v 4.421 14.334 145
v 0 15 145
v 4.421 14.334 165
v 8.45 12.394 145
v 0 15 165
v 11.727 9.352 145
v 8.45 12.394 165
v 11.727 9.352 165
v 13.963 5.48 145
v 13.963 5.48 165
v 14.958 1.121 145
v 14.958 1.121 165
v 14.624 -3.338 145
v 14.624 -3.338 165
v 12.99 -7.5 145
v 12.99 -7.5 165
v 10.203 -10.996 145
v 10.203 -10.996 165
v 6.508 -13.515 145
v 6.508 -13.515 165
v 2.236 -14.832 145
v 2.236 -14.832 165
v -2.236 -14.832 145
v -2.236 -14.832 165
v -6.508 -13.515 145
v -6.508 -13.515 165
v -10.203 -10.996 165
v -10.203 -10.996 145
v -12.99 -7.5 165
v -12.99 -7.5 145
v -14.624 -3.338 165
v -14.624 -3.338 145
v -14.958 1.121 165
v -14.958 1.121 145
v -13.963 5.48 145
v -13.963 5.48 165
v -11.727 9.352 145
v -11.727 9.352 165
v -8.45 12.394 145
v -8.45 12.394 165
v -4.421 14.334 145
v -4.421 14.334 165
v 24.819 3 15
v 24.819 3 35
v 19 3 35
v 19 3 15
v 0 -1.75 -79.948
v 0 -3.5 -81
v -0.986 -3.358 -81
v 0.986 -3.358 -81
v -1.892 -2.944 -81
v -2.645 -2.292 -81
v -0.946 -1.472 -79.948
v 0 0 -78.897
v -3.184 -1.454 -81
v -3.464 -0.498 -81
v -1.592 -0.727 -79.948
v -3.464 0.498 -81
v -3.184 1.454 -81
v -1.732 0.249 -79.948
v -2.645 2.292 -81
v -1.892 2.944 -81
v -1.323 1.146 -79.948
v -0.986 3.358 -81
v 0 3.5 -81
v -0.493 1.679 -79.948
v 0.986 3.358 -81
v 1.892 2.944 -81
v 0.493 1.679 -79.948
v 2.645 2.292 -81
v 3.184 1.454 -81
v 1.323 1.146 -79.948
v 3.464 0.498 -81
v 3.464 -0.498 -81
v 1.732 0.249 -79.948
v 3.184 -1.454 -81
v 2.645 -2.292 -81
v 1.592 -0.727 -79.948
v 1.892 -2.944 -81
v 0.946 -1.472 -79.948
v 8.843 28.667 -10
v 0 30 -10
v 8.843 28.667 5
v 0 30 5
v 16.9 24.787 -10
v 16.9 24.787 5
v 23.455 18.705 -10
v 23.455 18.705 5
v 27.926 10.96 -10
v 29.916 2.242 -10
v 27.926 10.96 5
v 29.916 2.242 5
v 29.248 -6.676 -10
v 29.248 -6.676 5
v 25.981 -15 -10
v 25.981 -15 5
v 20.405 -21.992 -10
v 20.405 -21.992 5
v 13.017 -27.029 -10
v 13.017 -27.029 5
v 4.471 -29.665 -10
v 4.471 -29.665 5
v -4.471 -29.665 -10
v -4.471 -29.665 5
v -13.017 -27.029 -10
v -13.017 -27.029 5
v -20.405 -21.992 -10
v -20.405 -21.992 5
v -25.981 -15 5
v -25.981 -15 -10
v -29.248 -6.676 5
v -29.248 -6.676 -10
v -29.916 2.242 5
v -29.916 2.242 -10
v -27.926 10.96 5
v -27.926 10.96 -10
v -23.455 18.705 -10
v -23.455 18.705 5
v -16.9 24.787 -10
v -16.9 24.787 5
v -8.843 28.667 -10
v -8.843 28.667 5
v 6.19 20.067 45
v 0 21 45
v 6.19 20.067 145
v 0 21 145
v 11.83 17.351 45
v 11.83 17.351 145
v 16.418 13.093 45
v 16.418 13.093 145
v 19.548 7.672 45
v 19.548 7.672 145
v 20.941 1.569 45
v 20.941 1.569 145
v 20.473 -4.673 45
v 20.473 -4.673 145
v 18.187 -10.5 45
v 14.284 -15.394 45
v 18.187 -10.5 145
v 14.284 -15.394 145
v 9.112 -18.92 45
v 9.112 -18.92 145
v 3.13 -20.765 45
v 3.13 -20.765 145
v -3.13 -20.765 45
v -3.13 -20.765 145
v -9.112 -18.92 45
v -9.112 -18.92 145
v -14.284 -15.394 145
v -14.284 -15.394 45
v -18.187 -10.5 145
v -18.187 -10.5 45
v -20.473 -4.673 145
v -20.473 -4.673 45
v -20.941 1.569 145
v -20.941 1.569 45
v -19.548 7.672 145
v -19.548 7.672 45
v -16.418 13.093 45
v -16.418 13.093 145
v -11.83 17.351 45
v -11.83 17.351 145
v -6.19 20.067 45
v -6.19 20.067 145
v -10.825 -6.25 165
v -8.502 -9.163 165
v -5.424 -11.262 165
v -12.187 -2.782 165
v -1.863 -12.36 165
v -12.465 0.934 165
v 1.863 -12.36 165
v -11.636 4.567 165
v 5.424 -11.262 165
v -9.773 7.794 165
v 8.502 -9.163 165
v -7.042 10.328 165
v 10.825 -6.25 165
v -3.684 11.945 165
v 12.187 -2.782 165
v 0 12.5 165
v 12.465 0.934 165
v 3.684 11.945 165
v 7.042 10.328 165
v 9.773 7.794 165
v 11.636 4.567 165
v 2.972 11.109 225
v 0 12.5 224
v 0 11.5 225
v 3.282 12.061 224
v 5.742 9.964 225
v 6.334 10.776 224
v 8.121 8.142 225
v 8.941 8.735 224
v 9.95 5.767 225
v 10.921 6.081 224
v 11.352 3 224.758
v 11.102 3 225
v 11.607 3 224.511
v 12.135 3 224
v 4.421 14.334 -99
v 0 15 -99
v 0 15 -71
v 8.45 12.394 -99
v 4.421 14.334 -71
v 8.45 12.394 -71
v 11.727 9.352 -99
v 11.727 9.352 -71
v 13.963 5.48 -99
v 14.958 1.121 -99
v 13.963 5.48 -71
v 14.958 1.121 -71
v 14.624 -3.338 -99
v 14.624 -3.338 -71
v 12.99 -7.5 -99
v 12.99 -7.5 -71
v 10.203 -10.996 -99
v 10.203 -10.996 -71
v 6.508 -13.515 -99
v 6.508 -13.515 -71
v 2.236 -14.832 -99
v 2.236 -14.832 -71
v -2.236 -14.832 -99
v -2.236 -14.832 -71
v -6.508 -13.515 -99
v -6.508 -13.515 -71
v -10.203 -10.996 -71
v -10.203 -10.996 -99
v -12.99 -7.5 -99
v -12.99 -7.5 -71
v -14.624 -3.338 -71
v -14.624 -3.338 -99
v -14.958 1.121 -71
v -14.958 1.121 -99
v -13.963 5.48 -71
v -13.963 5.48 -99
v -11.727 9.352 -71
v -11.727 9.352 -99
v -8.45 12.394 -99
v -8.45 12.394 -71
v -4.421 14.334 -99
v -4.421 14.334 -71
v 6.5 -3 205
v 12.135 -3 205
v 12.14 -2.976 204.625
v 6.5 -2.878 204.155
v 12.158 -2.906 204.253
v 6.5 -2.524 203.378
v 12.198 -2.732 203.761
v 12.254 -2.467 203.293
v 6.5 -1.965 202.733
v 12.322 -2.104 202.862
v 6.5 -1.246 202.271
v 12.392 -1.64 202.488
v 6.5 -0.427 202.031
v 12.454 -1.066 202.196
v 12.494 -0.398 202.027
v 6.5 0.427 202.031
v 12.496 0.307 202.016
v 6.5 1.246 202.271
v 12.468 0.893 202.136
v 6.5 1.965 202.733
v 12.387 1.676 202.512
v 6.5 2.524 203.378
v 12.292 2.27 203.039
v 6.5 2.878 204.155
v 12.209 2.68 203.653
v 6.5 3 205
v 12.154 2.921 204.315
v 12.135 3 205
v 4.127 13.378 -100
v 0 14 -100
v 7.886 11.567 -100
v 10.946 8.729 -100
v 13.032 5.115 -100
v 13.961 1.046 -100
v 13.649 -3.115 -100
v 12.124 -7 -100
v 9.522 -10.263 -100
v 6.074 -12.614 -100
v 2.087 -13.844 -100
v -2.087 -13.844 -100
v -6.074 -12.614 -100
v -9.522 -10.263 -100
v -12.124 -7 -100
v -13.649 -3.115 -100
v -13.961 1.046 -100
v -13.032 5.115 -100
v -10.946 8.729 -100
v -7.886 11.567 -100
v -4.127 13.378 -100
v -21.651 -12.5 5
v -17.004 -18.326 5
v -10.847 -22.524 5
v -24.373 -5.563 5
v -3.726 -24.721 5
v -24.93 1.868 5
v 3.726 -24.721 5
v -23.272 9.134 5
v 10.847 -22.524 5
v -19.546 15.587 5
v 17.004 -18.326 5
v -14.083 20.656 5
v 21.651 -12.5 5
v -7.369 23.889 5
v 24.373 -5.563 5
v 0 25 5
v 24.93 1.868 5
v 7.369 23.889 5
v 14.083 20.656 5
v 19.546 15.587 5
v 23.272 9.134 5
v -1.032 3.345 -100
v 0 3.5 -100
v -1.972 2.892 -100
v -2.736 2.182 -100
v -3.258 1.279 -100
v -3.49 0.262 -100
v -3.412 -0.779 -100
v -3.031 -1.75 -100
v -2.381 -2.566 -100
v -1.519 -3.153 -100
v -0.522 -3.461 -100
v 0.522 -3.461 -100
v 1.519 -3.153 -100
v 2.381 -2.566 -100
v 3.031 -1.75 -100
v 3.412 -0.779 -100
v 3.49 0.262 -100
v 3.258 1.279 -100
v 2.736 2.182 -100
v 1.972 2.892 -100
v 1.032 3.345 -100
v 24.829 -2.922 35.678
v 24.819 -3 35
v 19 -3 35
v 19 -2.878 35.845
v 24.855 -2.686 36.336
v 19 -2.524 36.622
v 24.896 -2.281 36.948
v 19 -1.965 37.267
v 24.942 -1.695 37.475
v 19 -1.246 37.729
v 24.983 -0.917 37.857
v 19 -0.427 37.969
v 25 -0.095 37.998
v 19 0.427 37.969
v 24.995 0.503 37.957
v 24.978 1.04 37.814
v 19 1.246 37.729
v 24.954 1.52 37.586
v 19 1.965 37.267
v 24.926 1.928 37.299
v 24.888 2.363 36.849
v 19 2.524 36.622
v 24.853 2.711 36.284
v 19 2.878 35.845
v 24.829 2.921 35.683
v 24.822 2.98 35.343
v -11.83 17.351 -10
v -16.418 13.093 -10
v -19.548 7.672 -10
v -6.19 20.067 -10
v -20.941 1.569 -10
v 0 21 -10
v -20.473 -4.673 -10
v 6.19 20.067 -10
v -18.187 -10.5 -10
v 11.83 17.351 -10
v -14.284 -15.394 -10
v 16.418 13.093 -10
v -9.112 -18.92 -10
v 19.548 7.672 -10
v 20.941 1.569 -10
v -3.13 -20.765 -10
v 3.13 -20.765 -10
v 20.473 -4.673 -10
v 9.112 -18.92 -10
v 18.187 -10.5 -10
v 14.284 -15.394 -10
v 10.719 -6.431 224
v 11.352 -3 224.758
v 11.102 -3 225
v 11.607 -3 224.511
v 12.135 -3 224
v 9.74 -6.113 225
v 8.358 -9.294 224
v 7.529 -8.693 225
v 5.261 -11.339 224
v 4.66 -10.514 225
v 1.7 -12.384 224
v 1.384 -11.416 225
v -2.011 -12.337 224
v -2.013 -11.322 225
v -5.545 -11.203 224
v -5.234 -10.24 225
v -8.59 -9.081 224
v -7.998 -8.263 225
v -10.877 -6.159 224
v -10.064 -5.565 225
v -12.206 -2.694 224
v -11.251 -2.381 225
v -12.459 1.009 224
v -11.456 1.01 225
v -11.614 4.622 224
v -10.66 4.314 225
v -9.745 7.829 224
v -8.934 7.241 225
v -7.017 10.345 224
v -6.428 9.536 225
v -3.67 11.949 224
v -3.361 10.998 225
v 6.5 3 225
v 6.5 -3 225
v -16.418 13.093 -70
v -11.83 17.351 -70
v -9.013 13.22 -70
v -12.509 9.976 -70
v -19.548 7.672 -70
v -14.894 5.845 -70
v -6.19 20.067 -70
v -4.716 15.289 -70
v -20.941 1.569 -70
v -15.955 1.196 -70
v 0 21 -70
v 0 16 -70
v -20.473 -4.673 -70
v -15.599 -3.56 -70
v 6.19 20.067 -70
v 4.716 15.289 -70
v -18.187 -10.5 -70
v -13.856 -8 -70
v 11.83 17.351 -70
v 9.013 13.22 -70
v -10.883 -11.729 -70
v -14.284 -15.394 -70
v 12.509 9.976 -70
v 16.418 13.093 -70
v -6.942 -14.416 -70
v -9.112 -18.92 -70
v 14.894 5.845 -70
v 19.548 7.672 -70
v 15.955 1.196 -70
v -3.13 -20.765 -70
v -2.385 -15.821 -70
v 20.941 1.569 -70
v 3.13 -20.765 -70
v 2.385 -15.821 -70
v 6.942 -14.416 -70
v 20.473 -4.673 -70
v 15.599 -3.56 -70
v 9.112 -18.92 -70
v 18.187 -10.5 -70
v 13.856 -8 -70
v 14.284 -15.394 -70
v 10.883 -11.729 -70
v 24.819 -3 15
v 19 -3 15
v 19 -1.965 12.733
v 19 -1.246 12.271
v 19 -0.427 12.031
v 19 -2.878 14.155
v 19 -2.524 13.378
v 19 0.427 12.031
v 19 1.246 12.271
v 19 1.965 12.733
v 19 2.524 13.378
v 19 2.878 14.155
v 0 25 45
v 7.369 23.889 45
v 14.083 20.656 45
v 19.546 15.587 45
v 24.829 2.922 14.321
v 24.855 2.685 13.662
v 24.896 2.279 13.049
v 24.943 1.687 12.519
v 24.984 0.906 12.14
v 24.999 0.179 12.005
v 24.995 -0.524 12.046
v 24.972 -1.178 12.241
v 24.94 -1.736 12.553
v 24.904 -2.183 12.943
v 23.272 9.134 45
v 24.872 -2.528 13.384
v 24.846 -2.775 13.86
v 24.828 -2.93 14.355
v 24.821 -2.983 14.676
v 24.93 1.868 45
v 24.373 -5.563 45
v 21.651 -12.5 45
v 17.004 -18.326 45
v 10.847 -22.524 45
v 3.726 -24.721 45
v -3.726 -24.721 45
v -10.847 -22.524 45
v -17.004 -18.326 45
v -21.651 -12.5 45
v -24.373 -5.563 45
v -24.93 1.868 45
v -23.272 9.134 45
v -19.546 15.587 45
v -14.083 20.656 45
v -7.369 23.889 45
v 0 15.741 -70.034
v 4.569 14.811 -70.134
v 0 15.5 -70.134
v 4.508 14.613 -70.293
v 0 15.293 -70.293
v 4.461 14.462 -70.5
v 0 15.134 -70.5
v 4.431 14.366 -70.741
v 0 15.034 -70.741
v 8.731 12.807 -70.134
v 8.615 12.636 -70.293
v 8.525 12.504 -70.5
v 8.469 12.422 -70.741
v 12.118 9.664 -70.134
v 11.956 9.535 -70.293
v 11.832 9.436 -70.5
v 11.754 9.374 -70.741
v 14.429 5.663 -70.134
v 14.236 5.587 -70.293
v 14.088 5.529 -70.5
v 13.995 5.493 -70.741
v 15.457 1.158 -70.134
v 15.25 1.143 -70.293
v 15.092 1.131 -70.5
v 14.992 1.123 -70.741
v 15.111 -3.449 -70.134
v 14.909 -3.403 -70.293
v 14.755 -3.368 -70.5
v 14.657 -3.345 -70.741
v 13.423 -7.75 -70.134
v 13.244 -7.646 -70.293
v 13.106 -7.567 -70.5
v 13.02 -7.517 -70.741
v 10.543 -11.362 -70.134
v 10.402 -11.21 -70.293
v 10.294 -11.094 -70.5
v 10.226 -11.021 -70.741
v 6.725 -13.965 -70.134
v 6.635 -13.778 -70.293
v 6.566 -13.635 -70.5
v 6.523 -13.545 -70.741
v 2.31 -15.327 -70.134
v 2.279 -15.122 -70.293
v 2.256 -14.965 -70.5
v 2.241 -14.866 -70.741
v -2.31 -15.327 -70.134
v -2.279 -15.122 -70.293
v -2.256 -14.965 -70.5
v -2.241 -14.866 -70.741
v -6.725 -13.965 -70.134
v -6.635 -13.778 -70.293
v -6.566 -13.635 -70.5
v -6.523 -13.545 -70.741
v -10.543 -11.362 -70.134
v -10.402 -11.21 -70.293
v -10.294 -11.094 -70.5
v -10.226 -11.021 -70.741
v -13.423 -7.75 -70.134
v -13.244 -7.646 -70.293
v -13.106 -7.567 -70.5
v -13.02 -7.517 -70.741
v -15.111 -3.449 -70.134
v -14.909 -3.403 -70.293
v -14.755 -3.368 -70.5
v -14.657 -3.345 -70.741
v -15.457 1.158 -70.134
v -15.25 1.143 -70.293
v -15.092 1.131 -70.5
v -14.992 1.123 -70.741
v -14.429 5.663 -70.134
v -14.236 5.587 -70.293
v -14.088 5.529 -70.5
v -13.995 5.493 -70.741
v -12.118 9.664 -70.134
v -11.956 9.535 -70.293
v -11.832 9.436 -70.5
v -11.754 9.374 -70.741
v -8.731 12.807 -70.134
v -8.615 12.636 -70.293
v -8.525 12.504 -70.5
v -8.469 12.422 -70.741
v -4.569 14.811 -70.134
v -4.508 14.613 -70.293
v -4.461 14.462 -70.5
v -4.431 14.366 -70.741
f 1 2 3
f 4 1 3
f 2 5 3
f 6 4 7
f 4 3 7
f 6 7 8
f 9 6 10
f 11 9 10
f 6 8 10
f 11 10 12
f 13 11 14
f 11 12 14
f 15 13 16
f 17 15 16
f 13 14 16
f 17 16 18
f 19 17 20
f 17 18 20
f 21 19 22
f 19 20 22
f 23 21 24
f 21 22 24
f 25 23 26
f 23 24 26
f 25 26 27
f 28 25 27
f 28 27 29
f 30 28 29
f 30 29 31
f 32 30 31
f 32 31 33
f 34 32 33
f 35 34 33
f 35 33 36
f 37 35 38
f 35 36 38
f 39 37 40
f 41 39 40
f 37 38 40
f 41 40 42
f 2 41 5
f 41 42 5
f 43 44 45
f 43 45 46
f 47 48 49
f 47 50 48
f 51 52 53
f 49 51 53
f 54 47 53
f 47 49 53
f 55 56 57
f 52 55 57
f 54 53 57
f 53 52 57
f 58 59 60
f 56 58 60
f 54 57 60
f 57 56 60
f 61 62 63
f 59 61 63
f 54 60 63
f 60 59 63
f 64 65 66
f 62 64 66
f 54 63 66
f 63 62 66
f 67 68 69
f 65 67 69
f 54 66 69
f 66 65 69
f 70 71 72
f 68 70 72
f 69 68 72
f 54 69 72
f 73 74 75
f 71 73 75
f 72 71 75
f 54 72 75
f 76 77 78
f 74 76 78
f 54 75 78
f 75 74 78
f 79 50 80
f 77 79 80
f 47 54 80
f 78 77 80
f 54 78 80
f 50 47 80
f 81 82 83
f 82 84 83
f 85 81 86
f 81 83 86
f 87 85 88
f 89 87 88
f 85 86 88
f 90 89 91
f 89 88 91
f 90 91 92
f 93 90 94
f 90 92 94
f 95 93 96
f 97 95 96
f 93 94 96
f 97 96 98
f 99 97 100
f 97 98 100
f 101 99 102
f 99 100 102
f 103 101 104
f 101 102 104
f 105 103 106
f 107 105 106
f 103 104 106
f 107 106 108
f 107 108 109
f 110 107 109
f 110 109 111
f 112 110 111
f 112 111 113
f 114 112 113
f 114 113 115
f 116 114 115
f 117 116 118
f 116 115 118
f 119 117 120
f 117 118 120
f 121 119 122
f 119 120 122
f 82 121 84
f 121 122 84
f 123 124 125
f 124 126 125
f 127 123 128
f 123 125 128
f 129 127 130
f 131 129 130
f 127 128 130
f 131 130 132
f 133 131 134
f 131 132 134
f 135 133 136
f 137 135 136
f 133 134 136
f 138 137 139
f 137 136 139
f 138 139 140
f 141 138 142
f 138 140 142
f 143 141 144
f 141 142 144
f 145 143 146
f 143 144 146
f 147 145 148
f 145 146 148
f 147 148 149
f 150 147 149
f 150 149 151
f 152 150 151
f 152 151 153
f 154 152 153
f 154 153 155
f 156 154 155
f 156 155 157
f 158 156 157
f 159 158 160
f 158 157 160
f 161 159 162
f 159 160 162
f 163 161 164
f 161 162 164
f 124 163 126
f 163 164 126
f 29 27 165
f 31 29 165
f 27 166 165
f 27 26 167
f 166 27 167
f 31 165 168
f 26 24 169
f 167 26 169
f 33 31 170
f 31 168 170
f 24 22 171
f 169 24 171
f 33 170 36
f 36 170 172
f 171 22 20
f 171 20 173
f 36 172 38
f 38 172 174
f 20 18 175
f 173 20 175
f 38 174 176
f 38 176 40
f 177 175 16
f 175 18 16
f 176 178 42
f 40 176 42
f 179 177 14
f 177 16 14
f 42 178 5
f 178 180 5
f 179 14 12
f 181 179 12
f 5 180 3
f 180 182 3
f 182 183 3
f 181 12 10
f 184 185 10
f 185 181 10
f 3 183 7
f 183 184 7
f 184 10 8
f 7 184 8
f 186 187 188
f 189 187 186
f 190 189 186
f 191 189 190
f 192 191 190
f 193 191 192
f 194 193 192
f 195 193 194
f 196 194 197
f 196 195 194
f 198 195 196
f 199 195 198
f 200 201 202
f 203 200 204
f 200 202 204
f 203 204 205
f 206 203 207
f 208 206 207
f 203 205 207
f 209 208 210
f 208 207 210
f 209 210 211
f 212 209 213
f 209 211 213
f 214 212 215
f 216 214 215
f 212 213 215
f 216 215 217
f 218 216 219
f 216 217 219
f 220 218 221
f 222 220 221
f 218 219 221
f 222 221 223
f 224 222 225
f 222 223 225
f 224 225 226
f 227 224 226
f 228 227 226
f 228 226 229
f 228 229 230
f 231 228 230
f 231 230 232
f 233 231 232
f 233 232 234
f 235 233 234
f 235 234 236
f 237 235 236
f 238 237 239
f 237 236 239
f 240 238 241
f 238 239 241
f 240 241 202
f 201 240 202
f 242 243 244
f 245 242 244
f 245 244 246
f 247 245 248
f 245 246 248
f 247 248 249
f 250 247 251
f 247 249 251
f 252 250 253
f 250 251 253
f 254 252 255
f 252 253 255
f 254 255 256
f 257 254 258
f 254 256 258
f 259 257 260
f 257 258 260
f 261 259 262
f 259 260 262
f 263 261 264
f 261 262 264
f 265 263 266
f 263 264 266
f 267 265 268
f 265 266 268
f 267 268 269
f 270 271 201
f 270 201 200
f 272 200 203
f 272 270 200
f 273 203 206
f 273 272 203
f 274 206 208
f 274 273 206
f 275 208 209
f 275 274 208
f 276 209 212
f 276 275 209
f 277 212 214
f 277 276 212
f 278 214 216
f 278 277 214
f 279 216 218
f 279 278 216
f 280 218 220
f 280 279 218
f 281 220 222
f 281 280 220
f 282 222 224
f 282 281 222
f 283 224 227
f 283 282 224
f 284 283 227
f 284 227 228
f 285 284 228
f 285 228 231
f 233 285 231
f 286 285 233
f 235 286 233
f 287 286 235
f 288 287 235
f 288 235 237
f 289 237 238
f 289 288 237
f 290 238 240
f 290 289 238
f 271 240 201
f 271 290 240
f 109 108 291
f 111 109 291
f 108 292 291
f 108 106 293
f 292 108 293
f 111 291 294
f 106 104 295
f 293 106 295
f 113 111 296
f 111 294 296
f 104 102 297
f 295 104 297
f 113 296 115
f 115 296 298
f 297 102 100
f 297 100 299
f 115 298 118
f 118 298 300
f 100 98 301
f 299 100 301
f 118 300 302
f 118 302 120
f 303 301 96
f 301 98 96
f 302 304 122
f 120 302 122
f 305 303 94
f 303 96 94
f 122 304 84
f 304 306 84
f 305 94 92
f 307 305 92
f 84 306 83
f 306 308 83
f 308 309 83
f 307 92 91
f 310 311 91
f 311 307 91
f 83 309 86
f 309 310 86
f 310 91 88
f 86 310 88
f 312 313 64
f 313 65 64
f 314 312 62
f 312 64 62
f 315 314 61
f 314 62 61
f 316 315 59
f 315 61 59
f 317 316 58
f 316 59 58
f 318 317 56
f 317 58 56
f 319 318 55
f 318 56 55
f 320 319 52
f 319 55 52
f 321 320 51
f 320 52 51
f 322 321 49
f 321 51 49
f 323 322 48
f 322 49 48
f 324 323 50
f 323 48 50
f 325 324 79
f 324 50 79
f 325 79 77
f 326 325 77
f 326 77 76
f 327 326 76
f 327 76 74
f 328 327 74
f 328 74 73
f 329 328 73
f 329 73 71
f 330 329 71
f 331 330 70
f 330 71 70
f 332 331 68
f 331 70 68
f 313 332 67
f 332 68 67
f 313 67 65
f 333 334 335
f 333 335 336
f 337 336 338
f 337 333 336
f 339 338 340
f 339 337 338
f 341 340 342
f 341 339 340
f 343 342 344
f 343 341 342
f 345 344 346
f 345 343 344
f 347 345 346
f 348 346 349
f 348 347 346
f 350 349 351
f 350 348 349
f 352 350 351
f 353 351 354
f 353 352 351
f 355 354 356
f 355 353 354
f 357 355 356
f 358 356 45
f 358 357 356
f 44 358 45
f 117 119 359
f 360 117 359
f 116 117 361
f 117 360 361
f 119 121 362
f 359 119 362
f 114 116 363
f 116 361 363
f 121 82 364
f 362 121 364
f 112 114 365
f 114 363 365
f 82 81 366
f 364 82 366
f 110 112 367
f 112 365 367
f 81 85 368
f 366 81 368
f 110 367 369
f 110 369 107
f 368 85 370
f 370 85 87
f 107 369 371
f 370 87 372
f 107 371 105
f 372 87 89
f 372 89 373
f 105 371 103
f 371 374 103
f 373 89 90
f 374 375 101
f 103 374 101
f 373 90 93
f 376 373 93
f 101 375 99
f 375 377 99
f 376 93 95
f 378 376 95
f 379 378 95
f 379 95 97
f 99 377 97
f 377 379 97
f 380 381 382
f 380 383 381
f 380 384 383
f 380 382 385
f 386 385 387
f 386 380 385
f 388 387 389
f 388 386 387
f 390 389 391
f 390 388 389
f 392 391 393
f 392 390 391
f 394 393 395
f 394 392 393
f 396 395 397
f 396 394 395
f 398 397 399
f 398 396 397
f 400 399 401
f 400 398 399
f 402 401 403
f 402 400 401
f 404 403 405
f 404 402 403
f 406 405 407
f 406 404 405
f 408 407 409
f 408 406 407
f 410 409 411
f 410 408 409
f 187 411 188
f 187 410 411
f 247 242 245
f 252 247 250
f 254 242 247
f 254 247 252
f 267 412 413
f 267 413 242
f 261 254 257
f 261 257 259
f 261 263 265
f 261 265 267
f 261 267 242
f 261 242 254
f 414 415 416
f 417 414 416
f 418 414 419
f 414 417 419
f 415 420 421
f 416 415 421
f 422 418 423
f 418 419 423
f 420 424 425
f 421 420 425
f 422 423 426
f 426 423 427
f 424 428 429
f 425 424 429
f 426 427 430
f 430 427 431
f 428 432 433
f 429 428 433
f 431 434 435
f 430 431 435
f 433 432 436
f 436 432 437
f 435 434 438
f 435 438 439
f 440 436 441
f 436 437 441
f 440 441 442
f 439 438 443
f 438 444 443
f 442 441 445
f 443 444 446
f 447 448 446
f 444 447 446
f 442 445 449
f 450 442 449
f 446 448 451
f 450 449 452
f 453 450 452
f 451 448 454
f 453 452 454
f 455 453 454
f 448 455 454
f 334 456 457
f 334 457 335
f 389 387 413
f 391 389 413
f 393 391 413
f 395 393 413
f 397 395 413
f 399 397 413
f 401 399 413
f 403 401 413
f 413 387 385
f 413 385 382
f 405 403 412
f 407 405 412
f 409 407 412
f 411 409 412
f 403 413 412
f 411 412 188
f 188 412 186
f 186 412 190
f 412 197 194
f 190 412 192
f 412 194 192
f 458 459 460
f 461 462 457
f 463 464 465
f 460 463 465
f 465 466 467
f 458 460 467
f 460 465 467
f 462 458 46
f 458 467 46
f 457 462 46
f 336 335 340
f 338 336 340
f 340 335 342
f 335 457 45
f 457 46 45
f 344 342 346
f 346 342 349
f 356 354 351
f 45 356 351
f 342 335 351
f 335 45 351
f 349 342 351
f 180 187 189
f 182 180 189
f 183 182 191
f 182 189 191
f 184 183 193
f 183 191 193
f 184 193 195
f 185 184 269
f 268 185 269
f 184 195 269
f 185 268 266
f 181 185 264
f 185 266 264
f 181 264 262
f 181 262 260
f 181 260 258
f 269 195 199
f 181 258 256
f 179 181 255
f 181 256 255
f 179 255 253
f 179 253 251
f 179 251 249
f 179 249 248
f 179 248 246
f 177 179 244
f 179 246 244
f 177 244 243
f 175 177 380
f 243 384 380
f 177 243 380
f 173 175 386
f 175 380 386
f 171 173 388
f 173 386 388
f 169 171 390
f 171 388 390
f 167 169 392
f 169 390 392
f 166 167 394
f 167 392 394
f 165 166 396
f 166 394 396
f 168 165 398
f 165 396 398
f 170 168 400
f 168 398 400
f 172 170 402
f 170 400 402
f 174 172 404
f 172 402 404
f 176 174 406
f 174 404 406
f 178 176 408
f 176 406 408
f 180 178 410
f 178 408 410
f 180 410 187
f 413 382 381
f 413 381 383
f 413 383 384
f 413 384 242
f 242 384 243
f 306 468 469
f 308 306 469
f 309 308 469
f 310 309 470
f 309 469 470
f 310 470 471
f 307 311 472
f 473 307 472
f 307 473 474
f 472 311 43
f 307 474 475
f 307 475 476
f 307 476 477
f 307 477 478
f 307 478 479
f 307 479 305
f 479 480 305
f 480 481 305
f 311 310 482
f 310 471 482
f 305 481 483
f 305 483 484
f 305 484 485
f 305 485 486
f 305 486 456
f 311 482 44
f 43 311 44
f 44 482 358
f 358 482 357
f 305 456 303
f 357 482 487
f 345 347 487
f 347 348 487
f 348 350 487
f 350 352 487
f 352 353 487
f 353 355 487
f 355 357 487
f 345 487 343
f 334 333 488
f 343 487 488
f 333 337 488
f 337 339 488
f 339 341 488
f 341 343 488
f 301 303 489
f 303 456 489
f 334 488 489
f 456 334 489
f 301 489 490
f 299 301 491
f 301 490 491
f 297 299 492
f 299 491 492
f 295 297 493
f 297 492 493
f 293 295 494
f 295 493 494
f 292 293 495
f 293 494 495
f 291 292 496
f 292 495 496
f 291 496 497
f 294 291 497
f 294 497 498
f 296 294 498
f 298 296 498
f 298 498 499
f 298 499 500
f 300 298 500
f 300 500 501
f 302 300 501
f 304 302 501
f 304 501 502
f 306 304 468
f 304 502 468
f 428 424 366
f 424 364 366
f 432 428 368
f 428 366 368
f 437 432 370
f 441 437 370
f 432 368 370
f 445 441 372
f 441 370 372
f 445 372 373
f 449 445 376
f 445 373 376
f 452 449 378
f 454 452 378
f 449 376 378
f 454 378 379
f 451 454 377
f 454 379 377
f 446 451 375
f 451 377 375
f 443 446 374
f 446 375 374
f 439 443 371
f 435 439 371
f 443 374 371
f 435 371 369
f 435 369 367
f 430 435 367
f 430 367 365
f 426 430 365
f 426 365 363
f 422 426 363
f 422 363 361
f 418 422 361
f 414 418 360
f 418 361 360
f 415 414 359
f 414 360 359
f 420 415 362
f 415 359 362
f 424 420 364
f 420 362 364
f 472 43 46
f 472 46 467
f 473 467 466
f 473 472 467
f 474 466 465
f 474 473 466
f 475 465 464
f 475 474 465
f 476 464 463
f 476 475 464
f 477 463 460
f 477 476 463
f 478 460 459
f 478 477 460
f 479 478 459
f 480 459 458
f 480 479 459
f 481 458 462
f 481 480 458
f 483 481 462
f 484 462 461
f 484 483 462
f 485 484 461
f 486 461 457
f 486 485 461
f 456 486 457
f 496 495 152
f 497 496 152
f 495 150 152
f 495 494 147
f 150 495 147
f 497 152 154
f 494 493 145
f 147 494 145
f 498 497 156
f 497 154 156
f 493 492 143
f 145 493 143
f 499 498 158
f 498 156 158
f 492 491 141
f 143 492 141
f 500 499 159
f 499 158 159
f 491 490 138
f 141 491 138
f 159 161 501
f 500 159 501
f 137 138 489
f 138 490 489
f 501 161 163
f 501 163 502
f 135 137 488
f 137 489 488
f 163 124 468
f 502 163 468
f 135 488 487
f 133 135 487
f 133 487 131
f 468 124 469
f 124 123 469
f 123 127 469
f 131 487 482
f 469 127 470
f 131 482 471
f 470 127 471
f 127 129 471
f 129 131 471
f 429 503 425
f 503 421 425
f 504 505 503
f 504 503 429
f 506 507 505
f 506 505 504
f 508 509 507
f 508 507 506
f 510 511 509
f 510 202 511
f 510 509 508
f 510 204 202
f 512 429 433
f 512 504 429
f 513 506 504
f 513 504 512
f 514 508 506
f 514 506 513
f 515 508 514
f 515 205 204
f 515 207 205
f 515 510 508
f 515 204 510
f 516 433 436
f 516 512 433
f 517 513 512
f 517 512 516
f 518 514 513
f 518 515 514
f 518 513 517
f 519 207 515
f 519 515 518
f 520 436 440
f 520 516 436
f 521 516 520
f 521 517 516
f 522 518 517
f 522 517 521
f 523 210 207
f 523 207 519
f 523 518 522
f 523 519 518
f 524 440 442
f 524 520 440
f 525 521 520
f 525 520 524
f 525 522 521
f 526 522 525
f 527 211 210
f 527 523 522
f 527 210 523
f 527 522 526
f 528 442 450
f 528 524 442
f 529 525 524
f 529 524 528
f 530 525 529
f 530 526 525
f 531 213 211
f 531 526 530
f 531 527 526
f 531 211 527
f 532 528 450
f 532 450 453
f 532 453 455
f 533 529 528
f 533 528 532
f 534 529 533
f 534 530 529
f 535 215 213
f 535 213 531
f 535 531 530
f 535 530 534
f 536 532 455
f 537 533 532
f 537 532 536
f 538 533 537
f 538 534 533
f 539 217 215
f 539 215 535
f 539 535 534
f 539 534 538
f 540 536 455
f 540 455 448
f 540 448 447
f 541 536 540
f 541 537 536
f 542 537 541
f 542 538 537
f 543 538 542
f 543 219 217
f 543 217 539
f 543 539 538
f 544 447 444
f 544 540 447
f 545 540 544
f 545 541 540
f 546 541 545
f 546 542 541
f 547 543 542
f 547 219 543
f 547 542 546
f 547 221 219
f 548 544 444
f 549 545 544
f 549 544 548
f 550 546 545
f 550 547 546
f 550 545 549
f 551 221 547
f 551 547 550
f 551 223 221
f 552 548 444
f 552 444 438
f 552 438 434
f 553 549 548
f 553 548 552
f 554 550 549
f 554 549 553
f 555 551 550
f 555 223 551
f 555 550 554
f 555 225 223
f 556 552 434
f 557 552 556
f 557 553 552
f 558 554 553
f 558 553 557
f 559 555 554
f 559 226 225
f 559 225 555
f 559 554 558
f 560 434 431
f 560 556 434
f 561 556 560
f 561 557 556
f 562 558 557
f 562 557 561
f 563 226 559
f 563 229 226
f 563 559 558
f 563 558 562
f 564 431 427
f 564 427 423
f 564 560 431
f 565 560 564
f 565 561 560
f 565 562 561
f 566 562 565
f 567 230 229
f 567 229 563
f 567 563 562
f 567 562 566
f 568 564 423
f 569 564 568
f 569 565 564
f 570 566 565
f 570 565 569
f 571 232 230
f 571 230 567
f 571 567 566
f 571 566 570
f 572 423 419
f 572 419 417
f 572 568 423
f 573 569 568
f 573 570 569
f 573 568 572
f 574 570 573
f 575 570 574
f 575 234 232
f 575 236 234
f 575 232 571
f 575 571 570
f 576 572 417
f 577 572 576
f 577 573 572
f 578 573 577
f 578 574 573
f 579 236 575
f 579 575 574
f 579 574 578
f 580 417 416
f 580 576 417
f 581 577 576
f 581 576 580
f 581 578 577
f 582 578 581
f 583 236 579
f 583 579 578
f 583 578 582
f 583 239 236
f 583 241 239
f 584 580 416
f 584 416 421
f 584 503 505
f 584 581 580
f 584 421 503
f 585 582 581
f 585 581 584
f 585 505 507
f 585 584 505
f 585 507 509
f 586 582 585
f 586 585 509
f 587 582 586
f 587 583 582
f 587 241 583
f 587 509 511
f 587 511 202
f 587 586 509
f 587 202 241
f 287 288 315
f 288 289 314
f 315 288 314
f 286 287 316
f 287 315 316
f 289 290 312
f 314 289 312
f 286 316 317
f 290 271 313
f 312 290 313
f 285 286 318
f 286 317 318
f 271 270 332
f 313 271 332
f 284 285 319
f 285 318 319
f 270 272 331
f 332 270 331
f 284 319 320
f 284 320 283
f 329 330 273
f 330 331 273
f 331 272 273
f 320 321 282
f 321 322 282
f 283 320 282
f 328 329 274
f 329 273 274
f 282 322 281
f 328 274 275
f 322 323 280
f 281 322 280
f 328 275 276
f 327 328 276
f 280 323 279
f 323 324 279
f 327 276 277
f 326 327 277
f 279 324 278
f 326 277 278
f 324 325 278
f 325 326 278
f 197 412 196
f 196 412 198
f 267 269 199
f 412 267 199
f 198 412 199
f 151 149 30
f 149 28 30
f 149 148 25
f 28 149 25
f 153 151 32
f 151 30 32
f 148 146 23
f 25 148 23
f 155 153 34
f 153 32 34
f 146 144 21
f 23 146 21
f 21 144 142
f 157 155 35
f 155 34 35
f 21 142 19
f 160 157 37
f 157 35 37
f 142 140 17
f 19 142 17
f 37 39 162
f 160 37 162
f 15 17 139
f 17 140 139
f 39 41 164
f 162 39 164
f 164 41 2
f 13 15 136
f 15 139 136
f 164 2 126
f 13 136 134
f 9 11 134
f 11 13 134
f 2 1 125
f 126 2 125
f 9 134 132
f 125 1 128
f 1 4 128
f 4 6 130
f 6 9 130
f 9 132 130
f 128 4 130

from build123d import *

# Parameters (mm, degrees)
M8X1_0_TAPPED_HOLE1_D     = 7
M8X1_0_TAPPED_HOLE1_DEPTH = 19
M8X1_0_TAPPED_HOLE1_TIP   = 2.103012167
CUT_EXTRUDE3_DEPTH        = 6
CUT_EXTRUDE4_DEPTH        = 6
CHAMFER1_SIZE             = 1
FILLET1_R                 = 1


with BuildPart() as part:
    # Sketch2 → Revolve1 (revolve)
    with BuildSketch(Plane(origin=(0, 0, 0), x_dir=(0, 0, -1), z_dir=(1, 0, 0))):
        Polygon((-225, 12.5), (-225, 0), (100, 0), (100, 15), (70, 15), (70, 21), (10, 21), (10, 30), (-5, 30), (-5, 25), (-45, 25), (-45, 21), (-145, 21), (-145, 15), (-165, 15), (-165, 12.5), align=None)
    revolve(axis=Axis((0, 0, 225), (0, 0, -1)))

    # M8x1.0 Tapped Hole1
    with Locations(Plane(origin=(0, 0, -100), x_dir=(0, -1, 0), z_dir=(0, 0, -1))):
        with Locations((0, 0)):
            Hole(M8X1_0_TAPPED_HOLE1_D / 2, depth=M8X1_0_TAPPED_HOLE1_DEPTH)
            with Locations((0, 0, -(M8X1_0_TAPPED_HOLE1_DEPTH + M8X1_0_TAPPED_HOLE1_TIP / 2))):  # 118° drill point
                Cone(0, M8X1_0_TAPPED_HOLE1_D / 2, M8X1_0_TAPPED_HOLE1_TIP, mode=Mode.SUBTRACT)

    # Sketch4 → Cut-Extrude3 (cut)
    with BuildSketch(Plane(origin=(12.5, 0, 0), x_dir=(0, 0, -1), z_dir=(1, 0, 0))):
        with BuildLine():
            Line((-205, 3), (-225, 3))
            Line((-225, 3), (-225, -3))
            Line((-225, -3), (-205, -3))
            ThreePointArc((-205, -3), (-202, 0), (-205, 3))
        make_face()
    extrude(amount=-CUT_EXTRUDE3_DEPTH, mode=Mode.SUBTRACT)

    # Sketch5 → Cut-Extrude4 (cut)
    with BuildSketch(Plane(origin=(25, 0, 0), x_dir=(0, 0, -1), z_dir=(1, 0, 0))):
        with BuildLine():
            Line((-35, 3), (-15, 3))
            ThreePointArc((-15, 3), (-12, 0), (-15, -3))
            Line((-15, -3), (-35, -3))
            ThreePointArc((-35, -3), (-38, 0), (-35, 3))
        make_face()
    extrude(amount=-CUT_EXTRUDE4_DEPTH, mode=Mode.SUBTRACT)

    # Chamfer1
    chamfer1_edges = [part.edges().sort_by_distance(p)[0] for p in [
        (0, -15, -100),
        (-9.842509843, -7.705517504, 225),
    ]]
    chamfer(chamfer1_edges, length=CHAMFER1_SIZE)

    # Fillet1
    fillet1_edges = [part.edges().sort_by_distance(p)[0] for p in [
        (0, -15, -70),
    ]]
    fillet(fillet1_edges, radius=FILLET1_R)


solid = part.part
